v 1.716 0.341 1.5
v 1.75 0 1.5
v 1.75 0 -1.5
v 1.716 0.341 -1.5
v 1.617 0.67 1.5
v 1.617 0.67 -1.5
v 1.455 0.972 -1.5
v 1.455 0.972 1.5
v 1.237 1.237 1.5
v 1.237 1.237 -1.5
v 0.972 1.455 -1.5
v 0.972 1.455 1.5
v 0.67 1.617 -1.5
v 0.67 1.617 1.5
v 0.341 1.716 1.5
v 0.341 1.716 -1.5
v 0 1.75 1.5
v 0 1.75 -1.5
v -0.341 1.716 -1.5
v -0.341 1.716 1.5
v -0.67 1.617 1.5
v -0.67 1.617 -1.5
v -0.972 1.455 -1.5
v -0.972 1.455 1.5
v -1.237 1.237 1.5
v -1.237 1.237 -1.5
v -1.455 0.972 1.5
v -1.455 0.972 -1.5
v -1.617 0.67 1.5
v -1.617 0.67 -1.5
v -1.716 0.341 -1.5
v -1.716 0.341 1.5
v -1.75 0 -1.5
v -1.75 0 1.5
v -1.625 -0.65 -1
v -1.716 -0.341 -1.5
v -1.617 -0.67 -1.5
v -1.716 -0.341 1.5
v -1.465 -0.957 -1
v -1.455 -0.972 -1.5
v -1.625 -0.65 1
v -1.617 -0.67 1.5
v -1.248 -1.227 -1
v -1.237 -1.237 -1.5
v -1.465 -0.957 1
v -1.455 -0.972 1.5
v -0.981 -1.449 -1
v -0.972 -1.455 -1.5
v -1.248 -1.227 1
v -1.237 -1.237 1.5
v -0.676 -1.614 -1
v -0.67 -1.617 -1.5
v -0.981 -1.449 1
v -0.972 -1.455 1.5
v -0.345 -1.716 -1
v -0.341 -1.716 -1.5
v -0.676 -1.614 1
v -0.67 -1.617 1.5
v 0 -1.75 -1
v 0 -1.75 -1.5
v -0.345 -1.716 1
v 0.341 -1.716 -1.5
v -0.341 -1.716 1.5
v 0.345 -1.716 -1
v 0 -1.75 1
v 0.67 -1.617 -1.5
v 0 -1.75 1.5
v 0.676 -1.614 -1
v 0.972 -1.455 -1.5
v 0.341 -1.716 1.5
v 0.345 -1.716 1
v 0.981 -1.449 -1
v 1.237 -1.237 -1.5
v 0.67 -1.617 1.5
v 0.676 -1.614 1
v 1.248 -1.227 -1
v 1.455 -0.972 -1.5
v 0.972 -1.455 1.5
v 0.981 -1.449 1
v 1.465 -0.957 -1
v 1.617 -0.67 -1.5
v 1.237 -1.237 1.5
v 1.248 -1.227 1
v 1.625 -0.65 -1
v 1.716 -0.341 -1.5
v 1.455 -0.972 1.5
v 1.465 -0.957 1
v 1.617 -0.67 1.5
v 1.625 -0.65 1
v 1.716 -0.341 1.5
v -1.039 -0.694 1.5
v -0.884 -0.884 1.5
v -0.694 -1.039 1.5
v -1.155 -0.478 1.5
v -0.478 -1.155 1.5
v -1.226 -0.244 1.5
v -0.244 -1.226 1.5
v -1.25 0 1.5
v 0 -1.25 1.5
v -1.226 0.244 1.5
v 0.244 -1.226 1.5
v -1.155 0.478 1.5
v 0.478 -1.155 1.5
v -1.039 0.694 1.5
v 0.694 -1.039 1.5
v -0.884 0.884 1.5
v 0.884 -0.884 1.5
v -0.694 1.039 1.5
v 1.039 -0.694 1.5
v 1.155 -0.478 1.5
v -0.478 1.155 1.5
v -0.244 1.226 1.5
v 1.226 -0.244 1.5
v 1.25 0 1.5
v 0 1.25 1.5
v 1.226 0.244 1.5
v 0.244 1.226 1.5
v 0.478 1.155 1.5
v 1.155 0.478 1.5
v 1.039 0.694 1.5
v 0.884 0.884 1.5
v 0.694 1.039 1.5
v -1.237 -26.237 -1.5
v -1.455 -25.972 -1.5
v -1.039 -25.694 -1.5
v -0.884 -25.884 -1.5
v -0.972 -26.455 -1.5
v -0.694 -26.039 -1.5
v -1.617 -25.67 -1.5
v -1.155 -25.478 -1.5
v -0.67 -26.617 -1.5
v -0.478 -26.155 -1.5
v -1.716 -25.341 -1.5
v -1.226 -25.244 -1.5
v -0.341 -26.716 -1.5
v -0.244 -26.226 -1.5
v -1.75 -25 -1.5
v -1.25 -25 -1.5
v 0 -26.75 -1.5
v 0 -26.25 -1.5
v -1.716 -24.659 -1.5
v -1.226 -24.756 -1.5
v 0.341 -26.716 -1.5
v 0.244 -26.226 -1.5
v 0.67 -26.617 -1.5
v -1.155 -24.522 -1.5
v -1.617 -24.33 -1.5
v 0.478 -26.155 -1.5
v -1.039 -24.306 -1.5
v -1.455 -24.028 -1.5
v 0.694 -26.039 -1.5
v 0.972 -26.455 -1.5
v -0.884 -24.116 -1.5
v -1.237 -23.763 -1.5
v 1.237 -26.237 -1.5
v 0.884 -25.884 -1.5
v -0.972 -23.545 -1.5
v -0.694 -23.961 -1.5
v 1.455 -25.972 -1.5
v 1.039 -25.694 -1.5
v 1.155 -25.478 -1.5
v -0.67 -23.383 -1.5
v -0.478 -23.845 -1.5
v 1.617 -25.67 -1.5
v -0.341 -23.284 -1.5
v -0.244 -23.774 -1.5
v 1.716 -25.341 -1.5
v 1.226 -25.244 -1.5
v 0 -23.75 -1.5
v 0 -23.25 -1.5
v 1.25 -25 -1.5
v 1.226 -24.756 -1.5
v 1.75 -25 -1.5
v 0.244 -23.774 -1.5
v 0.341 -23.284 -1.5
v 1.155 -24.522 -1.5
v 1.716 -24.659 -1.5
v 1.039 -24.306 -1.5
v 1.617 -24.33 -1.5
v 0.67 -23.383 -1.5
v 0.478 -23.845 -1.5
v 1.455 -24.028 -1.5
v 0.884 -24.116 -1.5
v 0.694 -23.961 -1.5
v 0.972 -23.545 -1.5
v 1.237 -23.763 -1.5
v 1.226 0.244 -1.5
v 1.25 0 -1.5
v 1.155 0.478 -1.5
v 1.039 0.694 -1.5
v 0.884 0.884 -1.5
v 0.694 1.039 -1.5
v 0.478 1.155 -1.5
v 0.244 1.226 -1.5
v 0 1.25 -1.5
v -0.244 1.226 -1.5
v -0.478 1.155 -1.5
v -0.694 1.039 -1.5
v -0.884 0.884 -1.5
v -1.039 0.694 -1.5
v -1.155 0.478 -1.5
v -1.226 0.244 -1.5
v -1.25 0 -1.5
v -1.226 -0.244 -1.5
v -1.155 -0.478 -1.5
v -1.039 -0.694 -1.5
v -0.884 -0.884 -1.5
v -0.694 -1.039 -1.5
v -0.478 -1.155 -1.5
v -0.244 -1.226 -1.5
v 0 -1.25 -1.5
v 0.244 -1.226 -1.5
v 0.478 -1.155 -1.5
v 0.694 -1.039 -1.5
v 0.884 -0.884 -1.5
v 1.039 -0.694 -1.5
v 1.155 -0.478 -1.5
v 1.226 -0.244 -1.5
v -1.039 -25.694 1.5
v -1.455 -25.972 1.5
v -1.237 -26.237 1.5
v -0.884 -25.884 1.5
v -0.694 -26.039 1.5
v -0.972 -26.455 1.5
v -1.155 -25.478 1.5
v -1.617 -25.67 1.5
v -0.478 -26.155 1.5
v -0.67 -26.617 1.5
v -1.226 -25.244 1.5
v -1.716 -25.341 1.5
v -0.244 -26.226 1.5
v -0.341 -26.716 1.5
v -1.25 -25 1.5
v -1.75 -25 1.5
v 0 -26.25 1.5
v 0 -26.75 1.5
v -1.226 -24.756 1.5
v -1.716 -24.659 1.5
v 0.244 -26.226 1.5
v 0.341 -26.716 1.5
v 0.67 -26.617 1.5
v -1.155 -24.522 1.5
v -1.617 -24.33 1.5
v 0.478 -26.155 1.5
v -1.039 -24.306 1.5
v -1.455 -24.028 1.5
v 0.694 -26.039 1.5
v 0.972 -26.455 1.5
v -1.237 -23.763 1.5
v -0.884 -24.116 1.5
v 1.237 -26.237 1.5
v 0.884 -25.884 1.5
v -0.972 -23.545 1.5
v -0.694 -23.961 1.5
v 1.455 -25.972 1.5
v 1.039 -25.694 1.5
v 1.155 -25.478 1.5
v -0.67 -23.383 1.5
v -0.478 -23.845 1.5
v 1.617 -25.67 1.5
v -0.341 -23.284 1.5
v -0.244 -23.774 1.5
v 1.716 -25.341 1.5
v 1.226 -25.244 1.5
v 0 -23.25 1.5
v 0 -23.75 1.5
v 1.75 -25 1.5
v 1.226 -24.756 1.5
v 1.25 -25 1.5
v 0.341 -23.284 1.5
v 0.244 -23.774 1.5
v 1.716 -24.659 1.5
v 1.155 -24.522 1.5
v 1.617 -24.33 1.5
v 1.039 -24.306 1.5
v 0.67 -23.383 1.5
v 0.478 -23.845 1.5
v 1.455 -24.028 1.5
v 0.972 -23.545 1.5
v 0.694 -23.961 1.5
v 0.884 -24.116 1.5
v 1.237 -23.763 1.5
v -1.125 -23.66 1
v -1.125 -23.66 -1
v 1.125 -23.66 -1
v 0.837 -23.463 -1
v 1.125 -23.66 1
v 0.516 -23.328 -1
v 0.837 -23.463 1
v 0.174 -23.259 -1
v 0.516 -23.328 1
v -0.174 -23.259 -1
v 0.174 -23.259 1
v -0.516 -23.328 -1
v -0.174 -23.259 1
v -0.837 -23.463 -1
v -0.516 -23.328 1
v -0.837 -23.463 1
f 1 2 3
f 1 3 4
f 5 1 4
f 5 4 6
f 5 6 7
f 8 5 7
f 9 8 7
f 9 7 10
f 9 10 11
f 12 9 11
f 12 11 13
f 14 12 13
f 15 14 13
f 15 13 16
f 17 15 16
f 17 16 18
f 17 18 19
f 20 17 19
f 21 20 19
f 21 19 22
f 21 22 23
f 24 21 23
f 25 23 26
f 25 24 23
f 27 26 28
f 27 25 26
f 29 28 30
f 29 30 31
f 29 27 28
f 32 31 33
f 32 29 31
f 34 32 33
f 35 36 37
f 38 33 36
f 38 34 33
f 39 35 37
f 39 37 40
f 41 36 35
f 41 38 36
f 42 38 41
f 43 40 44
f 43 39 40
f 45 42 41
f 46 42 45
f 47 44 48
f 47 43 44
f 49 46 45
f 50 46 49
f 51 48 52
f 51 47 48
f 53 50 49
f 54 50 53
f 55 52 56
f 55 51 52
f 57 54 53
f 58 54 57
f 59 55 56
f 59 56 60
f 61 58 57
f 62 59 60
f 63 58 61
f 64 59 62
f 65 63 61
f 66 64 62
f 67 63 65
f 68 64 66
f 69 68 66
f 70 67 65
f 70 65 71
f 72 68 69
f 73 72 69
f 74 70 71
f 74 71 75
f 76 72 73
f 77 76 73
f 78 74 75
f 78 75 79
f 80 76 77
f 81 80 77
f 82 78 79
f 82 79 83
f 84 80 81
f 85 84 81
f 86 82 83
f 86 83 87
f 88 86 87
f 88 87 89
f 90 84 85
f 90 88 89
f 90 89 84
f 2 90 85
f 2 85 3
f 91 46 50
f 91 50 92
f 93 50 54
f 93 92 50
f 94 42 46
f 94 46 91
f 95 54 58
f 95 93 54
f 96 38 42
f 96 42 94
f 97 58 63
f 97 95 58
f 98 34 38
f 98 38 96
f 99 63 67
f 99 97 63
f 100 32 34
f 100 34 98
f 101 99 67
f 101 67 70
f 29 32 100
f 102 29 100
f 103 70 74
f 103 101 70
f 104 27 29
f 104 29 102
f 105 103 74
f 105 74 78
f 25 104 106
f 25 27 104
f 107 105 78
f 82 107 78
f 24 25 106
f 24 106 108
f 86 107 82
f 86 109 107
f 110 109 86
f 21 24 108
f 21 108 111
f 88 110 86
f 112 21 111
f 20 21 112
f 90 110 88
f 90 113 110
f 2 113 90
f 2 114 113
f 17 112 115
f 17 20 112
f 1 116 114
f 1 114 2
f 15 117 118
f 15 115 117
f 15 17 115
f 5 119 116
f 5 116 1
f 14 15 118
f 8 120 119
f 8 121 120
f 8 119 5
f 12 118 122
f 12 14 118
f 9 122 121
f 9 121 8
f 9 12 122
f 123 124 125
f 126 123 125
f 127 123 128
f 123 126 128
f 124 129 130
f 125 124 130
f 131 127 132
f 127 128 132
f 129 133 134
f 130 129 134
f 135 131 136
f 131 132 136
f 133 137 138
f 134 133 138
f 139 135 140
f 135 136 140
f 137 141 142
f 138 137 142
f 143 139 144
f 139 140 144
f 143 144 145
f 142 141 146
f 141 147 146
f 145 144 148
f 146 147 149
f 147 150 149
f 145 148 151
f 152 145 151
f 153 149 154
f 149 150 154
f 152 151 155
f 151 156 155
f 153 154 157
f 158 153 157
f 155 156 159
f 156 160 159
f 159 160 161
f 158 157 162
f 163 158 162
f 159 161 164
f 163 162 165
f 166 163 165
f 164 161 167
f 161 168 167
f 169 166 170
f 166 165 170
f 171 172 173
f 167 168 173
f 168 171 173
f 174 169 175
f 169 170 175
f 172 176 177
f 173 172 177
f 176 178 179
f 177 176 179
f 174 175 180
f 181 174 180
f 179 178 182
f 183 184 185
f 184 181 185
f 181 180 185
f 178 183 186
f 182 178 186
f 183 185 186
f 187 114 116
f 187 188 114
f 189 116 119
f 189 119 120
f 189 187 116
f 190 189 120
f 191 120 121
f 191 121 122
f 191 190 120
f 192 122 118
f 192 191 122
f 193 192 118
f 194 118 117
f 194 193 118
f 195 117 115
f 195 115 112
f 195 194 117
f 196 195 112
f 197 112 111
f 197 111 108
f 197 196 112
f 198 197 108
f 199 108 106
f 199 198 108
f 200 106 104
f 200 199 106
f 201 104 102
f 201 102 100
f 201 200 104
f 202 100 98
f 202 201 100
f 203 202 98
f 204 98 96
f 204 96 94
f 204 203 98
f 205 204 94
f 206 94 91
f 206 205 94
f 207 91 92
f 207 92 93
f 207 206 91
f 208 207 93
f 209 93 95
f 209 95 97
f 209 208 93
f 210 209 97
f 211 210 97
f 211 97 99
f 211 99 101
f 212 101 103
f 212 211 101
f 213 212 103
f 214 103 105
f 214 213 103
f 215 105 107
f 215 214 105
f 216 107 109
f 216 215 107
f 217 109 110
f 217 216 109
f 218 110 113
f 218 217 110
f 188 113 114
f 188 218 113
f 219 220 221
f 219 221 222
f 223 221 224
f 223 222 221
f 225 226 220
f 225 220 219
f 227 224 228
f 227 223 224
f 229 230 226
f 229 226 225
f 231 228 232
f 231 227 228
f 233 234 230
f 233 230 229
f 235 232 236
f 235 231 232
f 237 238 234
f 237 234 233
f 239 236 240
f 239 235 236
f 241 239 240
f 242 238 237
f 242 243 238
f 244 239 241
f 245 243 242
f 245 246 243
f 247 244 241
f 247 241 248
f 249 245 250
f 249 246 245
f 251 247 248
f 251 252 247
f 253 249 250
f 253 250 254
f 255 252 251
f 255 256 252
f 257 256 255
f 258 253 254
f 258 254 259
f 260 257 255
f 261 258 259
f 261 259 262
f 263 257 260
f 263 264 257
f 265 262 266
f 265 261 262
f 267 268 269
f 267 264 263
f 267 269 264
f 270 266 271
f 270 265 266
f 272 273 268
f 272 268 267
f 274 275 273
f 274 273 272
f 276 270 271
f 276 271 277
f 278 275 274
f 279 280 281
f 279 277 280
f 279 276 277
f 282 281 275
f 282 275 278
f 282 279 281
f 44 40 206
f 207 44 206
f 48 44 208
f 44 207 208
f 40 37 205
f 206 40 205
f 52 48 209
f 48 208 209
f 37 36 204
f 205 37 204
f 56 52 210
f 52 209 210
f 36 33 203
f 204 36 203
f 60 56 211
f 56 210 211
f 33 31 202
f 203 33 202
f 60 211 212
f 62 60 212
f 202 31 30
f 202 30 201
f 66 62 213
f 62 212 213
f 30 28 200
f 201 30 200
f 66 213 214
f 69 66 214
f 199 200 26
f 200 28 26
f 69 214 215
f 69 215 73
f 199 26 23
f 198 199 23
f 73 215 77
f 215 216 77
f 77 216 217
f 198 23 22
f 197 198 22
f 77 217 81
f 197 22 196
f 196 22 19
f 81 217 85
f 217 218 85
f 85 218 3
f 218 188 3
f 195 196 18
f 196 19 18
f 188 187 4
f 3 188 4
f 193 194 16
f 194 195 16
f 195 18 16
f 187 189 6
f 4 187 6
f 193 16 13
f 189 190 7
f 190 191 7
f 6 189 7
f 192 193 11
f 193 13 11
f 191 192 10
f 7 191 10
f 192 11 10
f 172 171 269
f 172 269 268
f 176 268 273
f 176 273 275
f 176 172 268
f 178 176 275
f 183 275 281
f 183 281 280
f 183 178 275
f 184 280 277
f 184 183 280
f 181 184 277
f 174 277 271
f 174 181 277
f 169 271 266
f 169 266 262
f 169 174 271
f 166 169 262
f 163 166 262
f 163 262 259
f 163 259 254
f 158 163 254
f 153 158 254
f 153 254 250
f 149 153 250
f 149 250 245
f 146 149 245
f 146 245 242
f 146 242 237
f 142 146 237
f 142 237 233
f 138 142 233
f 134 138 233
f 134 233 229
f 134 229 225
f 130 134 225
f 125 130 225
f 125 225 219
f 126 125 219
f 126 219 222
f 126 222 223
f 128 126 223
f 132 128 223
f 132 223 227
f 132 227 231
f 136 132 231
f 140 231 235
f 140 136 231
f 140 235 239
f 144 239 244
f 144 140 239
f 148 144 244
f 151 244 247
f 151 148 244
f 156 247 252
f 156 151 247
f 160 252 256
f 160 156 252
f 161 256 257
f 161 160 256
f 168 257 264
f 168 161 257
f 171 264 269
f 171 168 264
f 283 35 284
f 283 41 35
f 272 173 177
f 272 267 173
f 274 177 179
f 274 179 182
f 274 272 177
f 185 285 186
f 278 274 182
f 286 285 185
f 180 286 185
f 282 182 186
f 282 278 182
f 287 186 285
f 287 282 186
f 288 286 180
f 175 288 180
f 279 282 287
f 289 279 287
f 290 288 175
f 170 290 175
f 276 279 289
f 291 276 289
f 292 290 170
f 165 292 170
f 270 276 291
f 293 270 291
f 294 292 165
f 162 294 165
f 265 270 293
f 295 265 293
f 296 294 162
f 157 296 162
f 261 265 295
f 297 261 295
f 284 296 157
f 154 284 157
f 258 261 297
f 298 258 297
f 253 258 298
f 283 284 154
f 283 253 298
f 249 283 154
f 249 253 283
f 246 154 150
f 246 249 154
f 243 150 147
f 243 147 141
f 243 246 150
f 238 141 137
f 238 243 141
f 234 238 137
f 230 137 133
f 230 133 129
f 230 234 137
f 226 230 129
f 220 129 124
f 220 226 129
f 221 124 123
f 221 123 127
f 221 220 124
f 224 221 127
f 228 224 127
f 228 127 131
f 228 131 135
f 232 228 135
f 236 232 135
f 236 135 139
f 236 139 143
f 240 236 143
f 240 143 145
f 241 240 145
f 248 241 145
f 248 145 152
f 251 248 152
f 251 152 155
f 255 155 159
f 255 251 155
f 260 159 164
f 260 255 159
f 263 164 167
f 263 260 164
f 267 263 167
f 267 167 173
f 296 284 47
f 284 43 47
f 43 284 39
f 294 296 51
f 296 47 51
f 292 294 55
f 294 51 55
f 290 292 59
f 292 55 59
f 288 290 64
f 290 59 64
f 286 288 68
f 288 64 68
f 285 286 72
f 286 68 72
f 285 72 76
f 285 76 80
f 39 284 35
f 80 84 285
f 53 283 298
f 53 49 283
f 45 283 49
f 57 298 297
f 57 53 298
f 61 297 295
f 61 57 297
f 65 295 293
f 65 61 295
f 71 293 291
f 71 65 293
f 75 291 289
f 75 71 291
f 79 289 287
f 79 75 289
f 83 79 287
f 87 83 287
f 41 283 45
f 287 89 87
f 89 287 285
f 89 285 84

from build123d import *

# Parameters (mm, degrees)
BOSS_EXTRUDE1_DEPTH       = 1.5
BOSS_EXTRUDE1_DEPTH_BACK  = 1.5
SKETCH10_R                = 1.75
SKETCH10_R_2              = 1.25
BOSS_EXTRUDE12_DEPTH      = 1.5
BOSS_EXTRUDE12_DEPTH_BACK = 1.5
SKETCH11_R                = 1.75
SKETCH11_R_2              = 1.25
BOSS_EXTRUDE13_DEPTH      = 1
BOSS_EXTRUDE13_DEPTH_BACK = 1
SKETCH1_R                 = 1.25


with BuildPart() as part:
    # Sketch10 → Boss-Extrude1 (new, two sides: drawn at the far end of the back side and taken through both)
    with BuildSketch(Plane.XY.offset(-BOSS_EXTRUDE1_DEPTH_BACK)):
        Circle(SKETCH10_R)
        Circle(SKETCH10_R_2, mode=Mode.SUBTRACT)
    extrude(amount=BOSS_EXTRUDE1_DEPTH + BOSS_EXTRUDE1_DEPTH_BACK)



with BuildPart() as body_2:
    # Sketch11 → Boss-Extrude12 (new, two sides: drawn at the far end of the back side and taken through both)
    with BuildSketch(Plane.XY.offset(-BOSS_EXTRUDE12_DEPTH_BACK)):
        with Locations((0, -25)):
            Circle(SKETCH11_R)
        with Locations((0, -25)):
            Circle(SKETCH11_R_2, mode=Mode.SUBTRACT)
    extrude(amount=BOSS_EXTRUDE12_DEPTH + BOSS_EXTRUDE12_DEPTH_BACK)


with BuildPart() as part_1:
    add(part.part)

    add(body_2.part)  # Boss-Extrude13 merges body 2
    # Sketch1 → Boss-Extrude13 (add, two sides: drawn at the far end of the back side and taken through both)
    with BuildSketch(Plane.XY.offset(-BOSS_EXTRUDE13_DEPTH_BACK)):
        with BuildLine():
            Line((-1.625, -0.649519053), (-1.125, -23.659524338))
            ThreePointArc((-1.125, -23.659524338), (0, -26.75), (1.125, -23.659524338))
            Line((1.125, -23.659524338), (1.625, -0.649519053))
            ThreePointArc((1.625, -0.649519053), (0, 1.75), (-1.625, -0.649519053))
        make_face()
        Circle(SKETCH1_R, mode=Mode.SUBTRACT)
        with Locations((0, -25)):
            Circle(SKETCH1_R, mode=Mode.SUBTRACT)
    extrude(amount=BOSS_EXTRUDE13_DEPTH + BOSS_EXTRUDE13_DEPTH_BACK)


solid = part_1.part
